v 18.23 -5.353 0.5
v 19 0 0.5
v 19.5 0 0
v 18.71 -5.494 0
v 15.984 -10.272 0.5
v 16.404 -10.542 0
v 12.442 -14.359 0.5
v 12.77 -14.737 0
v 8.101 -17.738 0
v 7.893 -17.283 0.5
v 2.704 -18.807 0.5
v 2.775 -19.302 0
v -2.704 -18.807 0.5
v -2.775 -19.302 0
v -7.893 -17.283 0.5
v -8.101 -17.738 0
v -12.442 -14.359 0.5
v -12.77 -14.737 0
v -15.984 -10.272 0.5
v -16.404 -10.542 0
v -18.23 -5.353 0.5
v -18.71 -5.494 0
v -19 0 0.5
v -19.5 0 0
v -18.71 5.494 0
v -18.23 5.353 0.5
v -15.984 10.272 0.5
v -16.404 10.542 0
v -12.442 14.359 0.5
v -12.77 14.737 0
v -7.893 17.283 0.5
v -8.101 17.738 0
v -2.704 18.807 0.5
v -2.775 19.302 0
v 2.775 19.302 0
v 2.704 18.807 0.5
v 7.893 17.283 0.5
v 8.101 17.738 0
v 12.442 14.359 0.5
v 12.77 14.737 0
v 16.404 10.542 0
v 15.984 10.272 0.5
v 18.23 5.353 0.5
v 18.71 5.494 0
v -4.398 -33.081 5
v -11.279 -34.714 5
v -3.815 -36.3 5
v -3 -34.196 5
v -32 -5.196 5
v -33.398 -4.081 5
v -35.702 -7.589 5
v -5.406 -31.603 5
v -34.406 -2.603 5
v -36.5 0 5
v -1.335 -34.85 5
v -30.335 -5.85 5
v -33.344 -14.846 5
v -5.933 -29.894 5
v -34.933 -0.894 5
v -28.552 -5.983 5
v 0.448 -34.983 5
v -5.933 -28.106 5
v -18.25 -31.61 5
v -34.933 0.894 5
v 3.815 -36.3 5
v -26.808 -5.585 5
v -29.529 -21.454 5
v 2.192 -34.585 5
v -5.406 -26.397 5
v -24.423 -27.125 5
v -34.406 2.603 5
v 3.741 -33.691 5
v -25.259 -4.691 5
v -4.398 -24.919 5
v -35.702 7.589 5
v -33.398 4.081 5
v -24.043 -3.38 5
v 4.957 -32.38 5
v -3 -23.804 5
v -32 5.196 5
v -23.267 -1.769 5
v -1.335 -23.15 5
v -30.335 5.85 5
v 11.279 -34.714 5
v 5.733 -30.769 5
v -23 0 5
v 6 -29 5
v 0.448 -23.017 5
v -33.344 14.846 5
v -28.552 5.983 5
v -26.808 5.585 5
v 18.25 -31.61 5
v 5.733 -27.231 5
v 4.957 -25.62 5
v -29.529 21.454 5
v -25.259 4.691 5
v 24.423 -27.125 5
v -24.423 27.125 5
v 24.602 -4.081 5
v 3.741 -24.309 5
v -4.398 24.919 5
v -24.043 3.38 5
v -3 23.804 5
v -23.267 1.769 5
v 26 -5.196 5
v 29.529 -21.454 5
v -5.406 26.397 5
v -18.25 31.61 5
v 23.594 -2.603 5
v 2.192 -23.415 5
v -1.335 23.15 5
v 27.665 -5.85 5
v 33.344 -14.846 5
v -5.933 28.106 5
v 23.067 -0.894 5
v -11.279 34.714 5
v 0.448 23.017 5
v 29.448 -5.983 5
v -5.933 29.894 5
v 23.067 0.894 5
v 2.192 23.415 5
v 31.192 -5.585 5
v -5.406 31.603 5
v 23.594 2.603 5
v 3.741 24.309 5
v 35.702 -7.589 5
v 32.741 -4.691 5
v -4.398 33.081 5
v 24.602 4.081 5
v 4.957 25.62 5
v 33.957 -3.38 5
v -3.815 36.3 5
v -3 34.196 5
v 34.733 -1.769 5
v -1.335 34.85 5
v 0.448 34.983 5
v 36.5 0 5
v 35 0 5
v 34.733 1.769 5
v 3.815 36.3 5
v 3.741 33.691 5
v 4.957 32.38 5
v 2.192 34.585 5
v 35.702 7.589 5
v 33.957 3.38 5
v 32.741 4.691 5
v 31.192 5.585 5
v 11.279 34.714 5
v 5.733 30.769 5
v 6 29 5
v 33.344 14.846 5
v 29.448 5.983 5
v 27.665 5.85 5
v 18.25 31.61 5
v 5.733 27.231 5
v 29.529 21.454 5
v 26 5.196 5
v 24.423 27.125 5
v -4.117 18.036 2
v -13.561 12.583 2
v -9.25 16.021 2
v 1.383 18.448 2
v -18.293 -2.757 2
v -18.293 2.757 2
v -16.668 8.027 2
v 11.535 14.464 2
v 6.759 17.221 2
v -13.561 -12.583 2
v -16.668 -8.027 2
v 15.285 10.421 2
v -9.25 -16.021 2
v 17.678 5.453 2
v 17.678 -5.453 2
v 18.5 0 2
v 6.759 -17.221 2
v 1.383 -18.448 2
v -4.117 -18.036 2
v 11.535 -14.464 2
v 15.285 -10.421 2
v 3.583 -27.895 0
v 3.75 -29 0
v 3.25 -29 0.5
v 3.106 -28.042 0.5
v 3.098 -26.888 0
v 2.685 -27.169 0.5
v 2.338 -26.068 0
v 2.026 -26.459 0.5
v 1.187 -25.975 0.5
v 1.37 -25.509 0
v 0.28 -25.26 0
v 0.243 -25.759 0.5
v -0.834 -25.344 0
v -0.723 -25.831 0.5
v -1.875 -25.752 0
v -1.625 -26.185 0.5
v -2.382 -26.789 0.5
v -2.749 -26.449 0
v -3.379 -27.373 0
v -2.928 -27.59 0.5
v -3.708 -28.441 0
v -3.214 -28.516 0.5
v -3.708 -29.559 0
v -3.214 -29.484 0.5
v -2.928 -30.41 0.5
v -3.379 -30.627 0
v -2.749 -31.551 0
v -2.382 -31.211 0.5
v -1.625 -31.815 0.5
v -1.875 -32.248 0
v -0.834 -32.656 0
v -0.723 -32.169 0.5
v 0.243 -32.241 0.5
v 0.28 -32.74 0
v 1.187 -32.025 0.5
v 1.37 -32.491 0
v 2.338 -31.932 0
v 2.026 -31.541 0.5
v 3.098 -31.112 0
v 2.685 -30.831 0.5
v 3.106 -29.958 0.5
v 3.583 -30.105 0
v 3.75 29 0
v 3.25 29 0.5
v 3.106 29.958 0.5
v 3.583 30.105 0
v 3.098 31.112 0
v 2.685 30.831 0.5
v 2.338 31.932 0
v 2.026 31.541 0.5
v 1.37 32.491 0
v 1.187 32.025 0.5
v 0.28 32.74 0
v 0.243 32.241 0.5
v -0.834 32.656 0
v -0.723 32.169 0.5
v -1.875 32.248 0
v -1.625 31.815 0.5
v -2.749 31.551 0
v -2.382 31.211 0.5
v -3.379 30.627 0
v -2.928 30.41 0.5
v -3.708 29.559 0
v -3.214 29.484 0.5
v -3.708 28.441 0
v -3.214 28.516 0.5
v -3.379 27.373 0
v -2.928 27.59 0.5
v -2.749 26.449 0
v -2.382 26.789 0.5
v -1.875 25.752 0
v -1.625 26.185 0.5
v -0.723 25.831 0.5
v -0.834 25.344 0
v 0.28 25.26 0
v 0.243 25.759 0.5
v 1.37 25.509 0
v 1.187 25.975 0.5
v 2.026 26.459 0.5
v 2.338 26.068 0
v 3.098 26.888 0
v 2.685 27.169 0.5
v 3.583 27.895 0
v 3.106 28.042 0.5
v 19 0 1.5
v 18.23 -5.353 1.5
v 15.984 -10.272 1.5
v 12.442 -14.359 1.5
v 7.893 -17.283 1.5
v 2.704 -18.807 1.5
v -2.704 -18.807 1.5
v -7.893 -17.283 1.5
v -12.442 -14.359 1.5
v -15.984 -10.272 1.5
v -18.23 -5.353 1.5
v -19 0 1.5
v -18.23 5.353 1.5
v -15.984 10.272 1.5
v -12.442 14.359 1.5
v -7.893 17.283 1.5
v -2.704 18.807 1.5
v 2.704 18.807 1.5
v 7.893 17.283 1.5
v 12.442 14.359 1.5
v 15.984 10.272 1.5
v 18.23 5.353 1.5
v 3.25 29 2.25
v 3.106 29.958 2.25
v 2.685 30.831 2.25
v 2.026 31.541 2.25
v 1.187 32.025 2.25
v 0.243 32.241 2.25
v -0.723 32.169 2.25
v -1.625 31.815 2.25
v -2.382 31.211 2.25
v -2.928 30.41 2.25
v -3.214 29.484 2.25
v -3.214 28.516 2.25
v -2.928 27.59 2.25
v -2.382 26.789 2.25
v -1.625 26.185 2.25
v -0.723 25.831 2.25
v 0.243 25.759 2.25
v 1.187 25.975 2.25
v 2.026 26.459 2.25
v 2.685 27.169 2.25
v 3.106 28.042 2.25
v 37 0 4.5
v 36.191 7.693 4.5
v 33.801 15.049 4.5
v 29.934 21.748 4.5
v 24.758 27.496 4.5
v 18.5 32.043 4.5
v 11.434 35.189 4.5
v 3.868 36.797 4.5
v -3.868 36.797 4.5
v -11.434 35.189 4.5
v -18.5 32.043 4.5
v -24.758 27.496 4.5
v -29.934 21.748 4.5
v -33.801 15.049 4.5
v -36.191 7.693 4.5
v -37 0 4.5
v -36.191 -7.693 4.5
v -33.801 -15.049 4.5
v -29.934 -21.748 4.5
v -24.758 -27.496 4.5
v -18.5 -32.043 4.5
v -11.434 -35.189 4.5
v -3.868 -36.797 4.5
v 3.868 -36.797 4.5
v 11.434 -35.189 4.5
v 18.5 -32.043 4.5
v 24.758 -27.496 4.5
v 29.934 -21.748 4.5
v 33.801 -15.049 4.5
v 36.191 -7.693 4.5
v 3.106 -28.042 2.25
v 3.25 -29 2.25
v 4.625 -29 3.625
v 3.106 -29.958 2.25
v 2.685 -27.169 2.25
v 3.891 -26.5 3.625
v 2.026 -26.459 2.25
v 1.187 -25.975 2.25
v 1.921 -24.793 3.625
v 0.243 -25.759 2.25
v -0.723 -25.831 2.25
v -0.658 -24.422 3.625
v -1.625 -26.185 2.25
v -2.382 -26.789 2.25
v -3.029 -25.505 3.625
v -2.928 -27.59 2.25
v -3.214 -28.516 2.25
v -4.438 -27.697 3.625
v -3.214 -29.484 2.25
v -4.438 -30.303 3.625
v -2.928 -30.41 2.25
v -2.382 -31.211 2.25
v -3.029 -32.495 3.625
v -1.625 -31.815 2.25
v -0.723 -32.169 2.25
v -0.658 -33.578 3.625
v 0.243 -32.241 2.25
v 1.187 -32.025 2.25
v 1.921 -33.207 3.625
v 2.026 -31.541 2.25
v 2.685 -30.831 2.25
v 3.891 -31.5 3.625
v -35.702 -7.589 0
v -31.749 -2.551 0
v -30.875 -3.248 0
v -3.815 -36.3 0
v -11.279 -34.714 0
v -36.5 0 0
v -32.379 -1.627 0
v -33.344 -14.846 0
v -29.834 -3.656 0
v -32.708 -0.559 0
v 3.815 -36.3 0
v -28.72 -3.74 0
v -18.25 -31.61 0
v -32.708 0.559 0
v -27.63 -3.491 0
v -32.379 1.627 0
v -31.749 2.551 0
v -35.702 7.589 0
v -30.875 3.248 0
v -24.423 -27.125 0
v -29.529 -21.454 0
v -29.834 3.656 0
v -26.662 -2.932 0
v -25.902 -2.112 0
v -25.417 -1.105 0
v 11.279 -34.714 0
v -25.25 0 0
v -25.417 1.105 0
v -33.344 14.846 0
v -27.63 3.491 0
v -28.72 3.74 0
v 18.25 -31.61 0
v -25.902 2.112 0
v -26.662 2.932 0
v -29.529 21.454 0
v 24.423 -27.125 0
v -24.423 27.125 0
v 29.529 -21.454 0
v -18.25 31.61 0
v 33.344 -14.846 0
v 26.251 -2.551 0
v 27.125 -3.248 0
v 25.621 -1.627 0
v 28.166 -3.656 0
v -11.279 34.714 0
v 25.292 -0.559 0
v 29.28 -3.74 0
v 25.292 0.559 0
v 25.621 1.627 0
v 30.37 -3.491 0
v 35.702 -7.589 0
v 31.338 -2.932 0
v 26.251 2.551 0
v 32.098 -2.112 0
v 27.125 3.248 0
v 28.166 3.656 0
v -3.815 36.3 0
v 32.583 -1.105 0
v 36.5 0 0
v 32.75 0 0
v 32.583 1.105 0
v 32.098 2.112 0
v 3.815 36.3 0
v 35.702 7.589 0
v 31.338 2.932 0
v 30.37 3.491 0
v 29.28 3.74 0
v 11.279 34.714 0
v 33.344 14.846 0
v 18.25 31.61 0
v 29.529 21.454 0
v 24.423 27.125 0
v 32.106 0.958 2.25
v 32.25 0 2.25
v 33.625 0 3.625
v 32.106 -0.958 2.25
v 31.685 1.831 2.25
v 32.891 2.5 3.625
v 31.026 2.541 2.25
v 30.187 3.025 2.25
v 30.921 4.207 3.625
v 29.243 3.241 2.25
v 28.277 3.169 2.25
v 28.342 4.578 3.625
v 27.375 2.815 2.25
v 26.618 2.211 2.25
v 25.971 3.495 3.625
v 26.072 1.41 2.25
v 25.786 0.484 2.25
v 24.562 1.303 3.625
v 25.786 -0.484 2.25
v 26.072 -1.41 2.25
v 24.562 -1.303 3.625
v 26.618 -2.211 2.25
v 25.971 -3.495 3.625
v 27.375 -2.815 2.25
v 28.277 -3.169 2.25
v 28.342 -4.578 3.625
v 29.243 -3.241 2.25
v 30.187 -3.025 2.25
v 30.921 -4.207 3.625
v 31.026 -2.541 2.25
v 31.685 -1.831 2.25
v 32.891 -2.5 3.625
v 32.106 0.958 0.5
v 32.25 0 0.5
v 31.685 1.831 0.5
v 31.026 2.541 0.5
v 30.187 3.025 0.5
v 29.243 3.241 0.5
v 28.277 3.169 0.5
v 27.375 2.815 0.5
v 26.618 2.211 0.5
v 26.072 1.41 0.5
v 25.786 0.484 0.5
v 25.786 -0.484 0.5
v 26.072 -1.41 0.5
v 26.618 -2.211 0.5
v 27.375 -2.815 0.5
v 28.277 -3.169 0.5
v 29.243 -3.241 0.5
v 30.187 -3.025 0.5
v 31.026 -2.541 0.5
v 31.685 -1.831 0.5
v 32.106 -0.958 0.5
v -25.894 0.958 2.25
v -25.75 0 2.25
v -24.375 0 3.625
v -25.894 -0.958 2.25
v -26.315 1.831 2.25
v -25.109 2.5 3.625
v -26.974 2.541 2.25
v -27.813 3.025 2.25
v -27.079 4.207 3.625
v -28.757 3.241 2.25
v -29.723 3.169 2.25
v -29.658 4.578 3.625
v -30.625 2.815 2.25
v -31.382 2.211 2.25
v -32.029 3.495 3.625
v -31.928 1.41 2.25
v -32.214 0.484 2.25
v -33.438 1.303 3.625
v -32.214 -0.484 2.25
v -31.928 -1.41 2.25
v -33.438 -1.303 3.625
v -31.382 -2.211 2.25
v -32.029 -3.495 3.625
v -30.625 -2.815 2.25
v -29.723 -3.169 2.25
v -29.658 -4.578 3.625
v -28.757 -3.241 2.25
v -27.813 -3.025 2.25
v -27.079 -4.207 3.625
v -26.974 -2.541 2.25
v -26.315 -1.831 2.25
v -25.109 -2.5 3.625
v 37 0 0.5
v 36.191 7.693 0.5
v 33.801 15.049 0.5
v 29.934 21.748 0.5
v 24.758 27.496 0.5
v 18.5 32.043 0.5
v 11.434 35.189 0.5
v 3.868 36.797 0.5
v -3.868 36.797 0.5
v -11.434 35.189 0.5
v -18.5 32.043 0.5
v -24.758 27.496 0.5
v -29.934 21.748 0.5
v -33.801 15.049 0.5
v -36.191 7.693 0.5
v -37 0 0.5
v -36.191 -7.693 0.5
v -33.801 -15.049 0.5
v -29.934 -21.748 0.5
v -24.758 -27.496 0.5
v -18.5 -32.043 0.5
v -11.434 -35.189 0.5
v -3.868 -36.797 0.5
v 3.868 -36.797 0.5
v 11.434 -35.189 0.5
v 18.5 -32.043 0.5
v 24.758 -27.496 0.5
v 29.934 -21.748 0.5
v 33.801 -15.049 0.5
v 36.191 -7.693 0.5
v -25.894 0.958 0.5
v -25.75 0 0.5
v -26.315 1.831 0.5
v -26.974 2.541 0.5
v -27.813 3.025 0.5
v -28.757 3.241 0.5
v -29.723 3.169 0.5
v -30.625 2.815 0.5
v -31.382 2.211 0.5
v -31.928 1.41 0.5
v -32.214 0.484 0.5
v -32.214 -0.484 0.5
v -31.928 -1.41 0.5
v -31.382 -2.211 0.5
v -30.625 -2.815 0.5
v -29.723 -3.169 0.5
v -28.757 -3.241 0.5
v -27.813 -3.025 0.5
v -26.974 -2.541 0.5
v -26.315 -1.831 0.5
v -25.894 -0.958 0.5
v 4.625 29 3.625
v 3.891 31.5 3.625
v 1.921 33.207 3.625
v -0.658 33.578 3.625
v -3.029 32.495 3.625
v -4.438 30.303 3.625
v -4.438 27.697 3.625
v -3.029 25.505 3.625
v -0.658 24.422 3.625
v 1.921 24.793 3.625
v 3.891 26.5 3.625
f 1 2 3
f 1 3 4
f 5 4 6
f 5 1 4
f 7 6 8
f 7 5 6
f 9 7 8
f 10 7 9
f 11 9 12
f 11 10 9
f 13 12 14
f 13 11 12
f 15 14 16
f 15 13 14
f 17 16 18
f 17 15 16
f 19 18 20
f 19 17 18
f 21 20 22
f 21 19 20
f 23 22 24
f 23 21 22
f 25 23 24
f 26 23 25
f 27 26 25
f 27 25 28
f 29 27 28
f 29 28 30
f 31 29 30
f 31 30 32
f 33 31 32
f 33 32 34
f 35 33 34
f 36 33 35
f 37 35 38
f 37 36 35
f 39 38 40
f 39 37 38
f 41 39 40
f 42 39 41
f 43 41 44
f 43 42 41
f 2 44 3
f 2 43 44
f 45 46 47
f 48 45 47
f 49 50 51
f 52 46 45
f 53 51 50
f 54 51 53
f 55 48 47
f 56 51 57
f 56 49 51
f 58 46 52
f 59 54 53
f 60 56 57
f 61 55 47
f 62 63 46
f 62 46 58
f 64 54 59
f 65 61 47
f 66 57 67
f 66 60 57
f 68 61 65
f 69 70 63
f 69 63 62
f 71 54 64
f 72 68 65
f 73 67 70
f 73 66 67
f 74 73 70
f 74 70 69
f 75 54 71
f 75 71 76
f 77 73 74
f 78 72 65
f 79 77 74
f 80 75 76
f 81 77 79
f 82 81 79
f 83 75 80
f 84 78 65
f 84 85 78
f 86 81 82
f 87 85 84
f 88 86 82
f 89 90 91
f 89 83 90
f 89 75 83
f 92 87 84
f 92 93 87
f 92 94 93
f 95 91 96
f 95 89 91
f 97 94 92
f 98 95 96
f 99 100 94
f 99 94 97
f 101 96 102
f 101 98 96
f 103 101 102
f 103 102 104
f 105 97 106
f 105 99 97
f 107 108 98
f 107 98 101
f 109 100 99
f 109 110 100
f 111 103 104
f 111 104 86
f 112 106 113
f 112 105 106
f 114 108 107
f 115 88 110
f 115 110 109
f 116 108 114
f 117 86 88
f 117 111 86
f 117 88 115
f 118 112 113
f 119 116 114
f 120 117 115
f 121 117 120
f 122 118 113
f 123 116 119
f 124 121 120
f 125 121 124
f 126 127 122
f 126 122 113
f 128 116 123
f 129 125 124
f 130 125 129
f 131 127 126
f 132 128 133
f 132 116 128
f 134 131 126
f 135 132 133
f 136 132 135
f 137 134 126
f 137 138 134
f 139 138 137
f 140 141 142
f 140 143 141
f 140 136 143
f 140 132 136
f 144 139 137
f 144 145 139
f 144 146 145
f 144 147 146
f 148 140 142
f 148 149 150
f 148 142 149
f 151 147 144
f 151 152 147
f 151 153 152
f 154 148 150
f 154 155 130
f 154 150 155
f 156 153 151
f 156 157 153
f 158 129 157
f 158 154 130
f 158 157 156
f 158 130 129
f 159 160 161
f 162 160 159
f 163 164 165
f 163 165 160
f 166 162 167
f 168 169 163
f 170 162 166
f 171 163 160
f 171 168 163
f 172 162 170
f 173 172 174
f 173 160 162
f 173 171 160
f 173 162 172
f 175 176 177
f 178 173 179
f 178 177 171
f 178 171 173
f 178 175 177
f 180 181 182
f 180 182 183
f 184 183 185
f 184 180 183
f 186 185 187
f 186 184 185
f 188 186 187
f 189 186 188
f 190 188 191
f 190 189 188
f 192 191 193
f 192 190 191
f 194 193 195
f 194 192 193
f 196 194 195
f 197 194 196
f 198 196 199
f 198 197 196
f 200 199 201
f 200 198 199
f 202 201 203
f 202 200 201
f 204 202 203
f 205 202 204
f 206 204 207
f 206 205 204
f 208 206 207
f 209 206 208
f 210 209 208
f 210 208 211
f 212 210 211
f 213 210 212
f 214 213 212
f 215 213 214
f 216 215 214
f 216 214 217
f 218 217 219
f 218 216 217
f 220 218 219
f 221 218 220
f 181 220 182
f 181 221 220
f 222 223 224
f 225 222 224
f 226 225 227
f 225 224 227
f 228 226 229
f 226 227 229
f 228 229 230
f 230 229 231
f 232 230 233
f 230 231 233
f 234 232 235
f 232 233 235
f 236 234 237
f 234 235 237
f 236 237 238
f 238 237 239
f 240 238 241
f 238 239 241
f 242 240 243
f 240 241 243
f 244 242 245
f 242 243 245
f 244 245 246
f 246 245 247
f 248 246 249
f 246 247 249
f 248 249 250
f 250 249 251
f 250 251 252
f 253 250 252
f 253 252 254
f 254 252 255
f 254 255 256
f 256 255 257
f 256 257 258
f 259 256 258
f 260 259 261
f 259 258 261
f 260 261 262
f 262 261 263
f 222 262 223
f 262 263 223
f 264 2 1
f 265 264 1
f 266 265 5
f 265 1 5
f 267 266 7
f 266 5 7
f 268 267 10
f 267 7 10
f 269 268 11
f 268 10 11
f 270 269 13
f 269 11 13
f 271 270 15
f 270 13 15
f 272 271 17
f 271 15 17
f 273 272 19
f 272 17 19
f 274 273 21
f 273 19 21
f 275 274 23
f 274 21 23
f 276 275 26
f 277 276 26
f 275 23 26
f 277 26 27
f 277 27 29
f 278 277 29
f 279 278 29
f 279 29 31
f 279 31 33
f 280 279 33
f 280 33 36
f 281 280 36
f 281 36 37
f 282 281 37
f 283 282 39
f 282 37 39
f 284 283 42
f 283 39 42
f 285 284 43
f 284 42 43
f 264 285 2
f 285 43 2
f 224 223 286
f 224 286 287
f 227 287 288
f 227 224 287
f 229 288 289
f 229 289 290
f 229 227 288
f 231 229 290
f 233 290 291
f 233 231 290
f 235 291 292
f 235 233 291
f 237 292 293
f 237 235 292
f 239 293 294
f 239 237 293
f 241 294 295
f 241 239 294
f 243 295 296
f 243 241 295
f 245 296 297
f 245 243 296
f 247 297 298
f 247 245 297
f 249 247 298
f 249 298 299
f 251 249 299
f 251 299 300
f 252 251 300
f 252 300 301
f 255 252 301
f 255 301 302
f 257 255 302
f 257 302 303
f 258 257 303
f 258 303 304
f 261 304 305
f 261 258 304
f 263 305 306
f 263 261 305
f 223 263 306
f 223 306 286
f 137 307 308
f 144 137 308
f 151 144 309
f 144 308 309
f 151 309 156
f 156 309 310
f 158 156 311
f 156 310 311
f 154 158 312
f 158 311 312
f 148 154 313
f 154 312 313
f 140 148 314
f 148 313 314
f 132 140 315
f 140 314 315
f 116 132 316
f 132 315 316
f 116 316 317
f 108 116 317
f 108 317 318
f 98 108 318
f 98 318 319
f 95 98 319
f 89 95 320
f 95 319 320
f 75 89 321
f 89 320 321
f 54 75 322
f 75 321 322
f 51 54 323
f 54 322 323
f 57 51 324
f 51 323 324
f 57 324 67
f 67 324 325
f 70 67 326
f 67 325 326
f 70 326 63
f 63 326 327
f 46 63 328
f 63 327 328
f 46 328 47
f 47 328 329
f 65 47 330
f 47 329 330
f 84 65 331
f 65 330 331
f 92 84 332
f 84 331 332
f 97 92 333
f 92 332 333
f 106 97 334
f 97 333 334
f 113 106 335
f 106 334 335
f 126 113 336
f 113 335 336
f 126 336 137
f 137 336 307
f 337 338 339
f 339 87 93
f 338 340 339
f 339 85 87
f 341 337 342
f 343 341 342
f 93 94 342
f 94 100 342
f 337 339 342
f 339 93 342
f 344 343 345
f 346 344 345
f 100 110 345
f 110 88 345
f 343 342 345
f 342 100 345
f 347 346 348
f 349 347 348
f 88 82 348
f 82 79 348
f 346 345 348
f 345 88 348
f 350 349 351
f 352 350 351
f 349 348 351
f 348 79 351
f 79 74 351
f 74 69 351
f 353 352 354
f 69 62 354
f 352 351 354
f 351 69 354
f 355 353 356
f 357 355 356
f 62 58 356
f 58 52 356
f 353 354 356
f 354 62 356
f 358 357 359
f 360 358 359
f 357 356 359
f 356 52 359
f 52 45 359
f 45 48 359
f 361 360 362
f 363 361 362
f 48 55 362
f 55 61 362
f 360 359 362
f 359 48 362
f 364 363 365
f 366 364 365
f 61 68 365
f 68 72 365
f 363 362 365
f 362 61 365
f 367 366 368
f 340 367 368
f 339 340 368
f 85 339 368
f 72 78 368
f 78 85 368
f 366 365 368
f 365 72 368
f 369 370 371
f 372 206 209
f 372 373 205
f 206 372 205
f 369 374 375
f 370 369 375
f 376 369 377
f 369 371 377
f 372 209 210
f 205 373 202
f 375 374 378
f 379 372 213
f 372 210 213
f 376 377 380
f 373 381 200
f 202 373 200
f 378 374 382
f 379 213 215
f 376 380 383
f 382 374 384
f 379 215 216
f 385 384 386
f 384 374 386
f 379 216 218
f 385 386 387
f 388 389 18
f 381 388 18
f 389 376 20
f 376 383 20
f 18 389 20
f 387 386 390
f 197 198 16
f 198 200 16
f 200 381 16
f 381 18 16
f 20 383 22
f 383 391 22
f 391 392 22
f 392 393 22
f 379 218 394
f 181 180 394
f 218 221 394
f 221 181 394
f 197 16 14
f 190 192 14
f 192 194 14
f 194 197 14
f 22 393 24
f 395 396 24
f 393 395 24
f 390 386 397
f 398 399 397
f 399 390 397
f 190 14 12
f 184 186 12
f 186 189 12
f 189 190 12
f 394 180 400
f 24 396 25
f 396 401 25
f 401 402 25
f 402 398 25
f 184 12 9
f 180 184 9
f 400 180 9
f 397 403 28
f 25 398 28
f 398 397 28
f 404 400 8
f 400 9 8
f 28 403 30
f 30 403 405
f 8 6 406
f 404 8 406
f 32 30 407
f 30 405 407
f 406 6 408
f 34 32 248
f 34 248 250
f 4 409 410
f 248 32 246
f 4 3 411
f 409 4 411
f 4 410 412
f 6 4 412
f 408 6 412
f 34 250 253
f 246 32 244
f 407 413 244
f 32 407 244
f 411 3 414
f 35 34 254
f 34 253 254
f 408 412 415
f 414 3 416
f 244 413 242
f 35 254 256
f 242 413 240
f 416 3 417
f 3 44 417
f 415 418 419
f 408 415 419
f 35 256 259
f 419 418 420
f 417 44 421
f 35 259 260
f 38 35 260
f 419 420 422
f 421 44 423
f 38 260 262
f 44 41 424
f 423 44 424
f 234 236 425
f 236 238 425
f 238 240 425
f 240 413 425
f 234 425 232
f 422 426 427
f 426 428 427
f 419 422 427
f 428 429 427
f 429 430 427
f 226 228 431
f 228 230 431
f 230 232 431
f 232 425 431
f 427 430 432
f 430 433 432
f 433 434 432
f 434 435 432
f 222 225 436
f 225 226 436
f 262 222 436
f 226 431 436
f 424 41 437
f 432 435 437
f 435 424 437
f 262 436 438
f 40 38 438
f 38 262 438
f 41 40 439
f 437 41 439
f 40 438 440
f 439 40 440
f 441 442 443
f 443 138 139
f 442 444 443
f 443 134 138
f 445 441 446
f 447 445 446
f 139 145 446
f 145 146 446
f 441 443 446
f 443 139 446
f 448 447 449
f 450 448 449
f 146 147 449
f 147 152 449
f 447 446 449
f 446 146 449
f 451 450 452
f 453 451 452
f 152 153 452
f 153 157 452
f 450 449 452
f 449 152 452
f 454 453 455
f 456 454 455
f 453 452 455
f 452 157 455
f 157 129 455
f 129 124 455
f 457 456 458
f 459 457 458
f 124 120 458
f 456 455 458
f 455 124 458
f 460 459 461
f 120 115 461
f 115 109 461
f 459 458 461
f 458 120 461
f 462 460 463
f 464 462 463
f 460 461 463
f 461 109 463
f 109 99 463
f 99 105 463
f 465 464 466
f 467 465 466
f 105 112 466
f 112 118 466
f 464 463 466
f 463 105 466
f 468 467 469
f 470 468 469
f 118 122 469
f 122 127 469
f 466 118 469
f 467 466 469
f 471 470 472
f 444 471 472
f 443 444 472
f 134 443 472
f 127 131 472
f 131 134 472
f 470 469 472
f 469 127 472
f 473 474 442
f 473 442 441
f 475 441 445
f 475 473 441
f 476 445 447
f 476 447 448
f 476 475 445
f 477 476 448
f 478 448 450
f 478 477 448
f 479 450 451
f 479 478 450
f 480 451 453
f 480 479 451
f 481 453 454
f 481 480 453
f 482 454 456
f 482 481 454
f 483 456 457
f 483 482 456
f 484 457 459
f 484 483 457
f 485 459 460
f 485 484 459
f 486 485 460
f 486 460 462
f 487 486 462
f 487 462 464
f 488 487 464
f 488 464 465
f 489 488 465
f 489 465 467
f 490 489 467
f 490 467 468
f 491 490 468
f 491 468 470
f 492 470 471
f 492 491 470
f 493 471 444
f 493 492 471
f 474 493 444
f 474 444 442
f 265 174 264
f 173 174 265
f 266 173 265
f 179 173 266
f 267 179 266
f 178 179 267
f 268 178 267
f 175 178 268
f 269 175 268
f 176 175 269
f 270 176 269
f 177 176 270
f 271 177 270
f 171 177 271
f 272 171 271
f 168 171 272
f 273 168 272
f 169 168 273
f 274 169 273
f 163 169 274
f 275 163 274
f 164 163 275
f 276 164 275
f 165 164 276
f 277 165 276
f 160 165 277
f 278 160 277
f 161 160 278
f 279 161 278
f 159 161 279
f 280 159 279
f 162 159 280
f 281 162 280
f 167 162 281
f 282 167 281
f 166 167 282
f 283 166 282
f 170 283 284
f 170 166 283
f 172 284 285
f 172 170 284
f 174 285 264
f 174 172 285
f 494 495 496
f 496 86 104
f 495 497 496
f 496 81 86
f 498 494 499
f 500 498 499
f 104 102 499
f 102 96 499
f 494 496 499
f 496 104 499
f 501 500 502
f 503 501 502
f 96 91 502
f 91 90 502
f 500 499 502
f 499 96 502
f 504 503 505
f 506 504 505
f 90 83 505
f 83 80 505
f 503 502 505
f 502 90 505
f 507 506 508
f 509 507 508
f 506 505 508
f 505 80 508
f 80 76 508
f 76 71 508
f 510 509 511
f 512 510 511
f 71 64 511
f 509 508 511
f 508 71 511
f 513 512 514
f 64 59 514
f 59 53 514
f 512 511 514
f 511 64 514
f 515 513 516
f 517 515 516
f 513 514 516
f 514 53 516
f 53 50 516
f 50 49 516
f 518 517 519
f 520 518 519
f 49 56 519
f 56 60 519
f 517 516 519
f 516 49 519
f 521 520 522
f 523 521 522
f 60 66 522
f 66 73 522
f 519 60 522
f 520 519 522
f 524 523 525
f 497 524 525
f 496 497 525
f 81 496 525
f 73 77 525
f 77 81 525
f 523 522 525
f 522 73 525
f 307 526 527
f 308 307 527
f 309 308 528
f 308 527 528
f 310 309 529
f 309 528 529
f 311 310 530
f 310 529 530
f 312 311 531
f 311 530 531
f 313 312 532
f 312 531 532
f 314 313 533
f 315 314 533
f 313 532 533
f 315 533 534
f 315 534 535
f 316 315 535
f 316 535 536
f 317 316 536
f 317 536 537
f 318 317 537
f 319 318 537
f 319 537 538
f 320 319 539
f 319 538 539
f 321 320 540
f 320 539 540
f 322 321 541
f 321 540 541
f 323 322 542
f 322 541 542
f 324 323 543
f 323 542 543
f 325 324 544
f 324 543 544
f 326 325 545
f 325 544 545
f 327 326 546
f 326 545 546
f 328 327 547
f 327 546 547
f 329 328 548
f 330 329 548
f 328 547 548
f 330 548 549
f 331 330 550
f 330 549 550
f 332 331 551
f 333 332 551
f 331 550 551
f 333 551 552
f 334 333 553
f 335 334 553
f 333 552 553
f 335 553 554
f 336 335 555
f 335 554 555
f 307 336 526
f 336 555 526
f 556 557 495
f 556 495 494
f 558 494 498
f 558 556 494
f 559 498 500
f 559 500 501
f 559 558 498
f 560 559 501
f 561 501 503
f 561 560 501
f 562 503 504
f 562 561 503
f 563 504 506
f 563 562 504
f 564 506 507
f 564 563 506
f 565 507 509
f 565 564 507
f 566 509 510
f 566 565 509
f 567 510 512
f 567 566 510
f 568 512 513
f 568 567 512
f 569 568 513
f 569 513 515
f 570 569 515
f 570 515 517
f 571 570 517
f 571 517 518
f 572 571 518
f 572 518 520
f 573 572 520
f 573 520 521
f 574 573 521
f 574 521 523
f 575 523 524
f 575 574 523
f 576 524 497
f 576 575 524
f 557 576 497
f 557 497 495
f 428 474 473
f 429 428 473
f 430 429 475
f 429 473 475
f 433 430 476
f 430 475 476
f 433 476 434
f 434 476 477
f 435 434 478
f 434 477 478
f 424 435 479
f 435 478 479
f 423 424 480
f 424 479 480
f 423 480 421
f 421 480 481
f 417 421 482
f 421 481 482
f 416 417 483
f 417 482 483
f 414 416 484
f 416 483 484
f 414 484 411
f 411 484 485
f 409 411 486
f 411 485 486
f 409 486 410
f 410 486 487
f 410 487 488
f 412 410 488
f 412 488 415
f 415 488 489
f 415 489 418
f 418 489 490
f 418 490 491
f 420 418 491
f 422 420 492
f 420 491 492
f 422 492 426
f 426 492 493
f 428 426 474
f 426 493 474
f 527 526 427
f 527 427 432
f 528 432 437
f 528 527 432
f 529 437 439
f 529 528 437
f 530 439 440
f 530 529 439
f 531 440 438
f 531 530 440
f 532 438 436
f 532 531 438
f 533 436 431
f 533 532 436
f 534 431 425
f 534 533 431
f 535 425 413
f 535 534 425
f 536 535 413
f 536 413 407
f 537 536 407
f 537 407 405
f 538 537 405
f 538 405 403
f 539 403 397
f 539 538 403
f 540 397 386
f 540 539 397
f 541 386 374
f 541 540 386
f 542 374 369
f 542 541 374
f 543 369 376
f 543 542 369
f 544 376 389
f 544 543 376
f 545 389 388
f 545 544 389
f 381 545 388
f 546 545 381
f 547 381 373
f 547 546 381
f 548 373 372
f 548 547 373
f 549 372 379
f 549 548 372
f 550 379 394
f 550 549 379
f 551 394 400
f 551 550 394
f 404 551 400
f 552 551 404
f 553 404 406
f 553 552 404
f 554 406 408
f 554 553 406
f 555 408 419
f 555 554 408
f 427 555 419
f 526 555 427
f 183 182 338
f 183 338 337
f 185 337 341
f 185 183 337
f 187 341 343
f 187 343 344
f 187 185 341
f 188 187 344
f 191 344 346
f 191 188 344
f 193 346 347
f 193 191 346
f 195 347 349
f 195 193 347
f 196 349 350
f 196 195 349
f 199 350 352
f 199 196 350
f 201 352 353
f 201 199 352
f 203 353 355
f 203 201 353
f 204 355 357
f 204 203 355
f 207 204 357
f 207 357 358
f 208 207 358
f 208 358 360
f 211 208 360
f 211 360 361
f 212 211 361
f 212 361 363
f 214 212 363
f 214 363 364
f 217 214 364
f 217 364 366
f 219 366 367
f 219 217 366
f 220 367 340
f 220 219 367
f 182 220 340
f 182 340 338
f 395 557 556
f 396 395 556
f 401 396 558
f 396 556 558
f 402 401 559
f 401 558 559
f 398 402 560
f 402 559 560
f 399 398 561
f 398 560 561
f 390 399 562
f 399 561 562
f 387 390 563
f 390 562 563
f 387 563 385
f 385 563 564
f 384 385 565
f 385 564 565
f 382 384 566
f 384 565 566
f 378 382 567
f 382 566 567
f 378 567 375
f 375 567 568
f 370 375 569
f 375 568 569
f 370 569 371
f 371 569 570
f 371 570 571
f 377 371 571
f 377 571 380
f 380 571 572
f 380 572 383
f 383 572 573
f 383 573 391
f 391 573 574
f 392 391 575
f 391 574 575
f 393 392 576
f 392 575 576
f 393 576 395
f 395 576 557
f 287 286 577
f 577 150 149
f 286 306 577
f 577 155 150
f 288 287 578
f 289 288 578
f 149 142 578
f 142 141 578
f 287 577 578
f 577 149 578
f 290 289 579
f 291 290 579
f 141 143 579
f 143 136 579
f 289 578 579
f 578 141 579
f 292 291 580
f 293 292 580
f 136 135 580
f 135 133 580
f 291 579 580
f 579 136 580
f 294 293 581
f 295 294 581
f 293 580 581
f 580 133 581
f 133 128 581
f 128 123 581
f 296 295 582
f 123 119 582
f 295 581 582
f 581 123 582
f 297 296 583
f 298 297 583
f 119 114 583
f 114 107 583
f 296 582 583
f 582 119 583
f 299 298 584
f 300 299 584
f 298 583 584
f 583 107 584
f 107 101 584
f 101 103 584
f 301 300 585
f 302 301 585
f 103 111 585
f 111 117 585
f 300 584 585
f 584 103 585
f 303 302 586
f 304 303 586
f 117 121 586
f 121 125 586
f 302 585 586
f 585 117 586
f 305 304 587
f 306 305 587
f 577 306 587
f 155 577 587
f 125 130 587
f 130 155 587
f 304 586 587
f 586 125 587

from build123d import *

# Parameters (mm, degrees)
F0_R     = 37
F0_R_2   = 3.25
F1_DEPTH = 5
F2_SIZE  = 2.75
F3_SIZE  = 0.5
F4_R     = 19
F5_DEPTH = 2
F6_SIZE  = 0.5


with BuildPart() as f1:
    # F0 (on Top) → F1 (new body)
    with BuildSketch(Plane.XY):
        Circle(F0_R)
        with Locations((0, -29)):
            Circle(F0_R_2, mode=Mode.SUBTRACT)
        with Locations((-29, 0)):
            Circle(F0_R_2, mode=Mode.SUBTRACT)
        with Locations((29, 0)):
            Circle(F0_R_2, mode=Mode.SUBTRACT)
        with Locations((0, 29)):
            Circle(F0_R_2, mode=Mode.SUBTRACT)
    extrude(amount=F1_DEPTH)

    # F2
    f2_edges = [f1.edges().sort_by_distance(p)[0] for p in [
        (-3.25, -29, 5),
        (-32.25, 0, 5),
        (-3.25, 29, 5),
        (25.75, 0, 5),
    ]]
    chamfer(f2_edges, length=F2_SIZE)

    # F3
    f3_edges = [f1.edges().sort_by_distance(p)[0] for p in [
        (37, 0, 2.5),
        (-37, 0, 0),
        (-37, 0, 5),
        (-3.25, -29, 0),
        (-32.25, 0, 0),
        (-3.25, 29, 0),
        (25.75, 0, 0),
    ]]
    chamfer(f3_edges, length=F3_SIZE)

    # F4 (on face) → F5 (cut)
    with BuildSketch(Plane(origin=(0, 0, 0), x_dir=(1, 0, 0), z_dir=(0, 0, -1))):
        Circle(F4_R)
    extrude(amount=-F5_DEPTH, mode=Mode.SUBTRACT)

    # F6
    f6_edges = [f1.edges().sort_by_distance(p)[0] for p in [
        (19, 0, 1),
        (-19, 0, 0),
        (-19, 0, 2),
    ]]
    chamfer(f6_edges, length=F6_SIZE)


solid = f1.part
